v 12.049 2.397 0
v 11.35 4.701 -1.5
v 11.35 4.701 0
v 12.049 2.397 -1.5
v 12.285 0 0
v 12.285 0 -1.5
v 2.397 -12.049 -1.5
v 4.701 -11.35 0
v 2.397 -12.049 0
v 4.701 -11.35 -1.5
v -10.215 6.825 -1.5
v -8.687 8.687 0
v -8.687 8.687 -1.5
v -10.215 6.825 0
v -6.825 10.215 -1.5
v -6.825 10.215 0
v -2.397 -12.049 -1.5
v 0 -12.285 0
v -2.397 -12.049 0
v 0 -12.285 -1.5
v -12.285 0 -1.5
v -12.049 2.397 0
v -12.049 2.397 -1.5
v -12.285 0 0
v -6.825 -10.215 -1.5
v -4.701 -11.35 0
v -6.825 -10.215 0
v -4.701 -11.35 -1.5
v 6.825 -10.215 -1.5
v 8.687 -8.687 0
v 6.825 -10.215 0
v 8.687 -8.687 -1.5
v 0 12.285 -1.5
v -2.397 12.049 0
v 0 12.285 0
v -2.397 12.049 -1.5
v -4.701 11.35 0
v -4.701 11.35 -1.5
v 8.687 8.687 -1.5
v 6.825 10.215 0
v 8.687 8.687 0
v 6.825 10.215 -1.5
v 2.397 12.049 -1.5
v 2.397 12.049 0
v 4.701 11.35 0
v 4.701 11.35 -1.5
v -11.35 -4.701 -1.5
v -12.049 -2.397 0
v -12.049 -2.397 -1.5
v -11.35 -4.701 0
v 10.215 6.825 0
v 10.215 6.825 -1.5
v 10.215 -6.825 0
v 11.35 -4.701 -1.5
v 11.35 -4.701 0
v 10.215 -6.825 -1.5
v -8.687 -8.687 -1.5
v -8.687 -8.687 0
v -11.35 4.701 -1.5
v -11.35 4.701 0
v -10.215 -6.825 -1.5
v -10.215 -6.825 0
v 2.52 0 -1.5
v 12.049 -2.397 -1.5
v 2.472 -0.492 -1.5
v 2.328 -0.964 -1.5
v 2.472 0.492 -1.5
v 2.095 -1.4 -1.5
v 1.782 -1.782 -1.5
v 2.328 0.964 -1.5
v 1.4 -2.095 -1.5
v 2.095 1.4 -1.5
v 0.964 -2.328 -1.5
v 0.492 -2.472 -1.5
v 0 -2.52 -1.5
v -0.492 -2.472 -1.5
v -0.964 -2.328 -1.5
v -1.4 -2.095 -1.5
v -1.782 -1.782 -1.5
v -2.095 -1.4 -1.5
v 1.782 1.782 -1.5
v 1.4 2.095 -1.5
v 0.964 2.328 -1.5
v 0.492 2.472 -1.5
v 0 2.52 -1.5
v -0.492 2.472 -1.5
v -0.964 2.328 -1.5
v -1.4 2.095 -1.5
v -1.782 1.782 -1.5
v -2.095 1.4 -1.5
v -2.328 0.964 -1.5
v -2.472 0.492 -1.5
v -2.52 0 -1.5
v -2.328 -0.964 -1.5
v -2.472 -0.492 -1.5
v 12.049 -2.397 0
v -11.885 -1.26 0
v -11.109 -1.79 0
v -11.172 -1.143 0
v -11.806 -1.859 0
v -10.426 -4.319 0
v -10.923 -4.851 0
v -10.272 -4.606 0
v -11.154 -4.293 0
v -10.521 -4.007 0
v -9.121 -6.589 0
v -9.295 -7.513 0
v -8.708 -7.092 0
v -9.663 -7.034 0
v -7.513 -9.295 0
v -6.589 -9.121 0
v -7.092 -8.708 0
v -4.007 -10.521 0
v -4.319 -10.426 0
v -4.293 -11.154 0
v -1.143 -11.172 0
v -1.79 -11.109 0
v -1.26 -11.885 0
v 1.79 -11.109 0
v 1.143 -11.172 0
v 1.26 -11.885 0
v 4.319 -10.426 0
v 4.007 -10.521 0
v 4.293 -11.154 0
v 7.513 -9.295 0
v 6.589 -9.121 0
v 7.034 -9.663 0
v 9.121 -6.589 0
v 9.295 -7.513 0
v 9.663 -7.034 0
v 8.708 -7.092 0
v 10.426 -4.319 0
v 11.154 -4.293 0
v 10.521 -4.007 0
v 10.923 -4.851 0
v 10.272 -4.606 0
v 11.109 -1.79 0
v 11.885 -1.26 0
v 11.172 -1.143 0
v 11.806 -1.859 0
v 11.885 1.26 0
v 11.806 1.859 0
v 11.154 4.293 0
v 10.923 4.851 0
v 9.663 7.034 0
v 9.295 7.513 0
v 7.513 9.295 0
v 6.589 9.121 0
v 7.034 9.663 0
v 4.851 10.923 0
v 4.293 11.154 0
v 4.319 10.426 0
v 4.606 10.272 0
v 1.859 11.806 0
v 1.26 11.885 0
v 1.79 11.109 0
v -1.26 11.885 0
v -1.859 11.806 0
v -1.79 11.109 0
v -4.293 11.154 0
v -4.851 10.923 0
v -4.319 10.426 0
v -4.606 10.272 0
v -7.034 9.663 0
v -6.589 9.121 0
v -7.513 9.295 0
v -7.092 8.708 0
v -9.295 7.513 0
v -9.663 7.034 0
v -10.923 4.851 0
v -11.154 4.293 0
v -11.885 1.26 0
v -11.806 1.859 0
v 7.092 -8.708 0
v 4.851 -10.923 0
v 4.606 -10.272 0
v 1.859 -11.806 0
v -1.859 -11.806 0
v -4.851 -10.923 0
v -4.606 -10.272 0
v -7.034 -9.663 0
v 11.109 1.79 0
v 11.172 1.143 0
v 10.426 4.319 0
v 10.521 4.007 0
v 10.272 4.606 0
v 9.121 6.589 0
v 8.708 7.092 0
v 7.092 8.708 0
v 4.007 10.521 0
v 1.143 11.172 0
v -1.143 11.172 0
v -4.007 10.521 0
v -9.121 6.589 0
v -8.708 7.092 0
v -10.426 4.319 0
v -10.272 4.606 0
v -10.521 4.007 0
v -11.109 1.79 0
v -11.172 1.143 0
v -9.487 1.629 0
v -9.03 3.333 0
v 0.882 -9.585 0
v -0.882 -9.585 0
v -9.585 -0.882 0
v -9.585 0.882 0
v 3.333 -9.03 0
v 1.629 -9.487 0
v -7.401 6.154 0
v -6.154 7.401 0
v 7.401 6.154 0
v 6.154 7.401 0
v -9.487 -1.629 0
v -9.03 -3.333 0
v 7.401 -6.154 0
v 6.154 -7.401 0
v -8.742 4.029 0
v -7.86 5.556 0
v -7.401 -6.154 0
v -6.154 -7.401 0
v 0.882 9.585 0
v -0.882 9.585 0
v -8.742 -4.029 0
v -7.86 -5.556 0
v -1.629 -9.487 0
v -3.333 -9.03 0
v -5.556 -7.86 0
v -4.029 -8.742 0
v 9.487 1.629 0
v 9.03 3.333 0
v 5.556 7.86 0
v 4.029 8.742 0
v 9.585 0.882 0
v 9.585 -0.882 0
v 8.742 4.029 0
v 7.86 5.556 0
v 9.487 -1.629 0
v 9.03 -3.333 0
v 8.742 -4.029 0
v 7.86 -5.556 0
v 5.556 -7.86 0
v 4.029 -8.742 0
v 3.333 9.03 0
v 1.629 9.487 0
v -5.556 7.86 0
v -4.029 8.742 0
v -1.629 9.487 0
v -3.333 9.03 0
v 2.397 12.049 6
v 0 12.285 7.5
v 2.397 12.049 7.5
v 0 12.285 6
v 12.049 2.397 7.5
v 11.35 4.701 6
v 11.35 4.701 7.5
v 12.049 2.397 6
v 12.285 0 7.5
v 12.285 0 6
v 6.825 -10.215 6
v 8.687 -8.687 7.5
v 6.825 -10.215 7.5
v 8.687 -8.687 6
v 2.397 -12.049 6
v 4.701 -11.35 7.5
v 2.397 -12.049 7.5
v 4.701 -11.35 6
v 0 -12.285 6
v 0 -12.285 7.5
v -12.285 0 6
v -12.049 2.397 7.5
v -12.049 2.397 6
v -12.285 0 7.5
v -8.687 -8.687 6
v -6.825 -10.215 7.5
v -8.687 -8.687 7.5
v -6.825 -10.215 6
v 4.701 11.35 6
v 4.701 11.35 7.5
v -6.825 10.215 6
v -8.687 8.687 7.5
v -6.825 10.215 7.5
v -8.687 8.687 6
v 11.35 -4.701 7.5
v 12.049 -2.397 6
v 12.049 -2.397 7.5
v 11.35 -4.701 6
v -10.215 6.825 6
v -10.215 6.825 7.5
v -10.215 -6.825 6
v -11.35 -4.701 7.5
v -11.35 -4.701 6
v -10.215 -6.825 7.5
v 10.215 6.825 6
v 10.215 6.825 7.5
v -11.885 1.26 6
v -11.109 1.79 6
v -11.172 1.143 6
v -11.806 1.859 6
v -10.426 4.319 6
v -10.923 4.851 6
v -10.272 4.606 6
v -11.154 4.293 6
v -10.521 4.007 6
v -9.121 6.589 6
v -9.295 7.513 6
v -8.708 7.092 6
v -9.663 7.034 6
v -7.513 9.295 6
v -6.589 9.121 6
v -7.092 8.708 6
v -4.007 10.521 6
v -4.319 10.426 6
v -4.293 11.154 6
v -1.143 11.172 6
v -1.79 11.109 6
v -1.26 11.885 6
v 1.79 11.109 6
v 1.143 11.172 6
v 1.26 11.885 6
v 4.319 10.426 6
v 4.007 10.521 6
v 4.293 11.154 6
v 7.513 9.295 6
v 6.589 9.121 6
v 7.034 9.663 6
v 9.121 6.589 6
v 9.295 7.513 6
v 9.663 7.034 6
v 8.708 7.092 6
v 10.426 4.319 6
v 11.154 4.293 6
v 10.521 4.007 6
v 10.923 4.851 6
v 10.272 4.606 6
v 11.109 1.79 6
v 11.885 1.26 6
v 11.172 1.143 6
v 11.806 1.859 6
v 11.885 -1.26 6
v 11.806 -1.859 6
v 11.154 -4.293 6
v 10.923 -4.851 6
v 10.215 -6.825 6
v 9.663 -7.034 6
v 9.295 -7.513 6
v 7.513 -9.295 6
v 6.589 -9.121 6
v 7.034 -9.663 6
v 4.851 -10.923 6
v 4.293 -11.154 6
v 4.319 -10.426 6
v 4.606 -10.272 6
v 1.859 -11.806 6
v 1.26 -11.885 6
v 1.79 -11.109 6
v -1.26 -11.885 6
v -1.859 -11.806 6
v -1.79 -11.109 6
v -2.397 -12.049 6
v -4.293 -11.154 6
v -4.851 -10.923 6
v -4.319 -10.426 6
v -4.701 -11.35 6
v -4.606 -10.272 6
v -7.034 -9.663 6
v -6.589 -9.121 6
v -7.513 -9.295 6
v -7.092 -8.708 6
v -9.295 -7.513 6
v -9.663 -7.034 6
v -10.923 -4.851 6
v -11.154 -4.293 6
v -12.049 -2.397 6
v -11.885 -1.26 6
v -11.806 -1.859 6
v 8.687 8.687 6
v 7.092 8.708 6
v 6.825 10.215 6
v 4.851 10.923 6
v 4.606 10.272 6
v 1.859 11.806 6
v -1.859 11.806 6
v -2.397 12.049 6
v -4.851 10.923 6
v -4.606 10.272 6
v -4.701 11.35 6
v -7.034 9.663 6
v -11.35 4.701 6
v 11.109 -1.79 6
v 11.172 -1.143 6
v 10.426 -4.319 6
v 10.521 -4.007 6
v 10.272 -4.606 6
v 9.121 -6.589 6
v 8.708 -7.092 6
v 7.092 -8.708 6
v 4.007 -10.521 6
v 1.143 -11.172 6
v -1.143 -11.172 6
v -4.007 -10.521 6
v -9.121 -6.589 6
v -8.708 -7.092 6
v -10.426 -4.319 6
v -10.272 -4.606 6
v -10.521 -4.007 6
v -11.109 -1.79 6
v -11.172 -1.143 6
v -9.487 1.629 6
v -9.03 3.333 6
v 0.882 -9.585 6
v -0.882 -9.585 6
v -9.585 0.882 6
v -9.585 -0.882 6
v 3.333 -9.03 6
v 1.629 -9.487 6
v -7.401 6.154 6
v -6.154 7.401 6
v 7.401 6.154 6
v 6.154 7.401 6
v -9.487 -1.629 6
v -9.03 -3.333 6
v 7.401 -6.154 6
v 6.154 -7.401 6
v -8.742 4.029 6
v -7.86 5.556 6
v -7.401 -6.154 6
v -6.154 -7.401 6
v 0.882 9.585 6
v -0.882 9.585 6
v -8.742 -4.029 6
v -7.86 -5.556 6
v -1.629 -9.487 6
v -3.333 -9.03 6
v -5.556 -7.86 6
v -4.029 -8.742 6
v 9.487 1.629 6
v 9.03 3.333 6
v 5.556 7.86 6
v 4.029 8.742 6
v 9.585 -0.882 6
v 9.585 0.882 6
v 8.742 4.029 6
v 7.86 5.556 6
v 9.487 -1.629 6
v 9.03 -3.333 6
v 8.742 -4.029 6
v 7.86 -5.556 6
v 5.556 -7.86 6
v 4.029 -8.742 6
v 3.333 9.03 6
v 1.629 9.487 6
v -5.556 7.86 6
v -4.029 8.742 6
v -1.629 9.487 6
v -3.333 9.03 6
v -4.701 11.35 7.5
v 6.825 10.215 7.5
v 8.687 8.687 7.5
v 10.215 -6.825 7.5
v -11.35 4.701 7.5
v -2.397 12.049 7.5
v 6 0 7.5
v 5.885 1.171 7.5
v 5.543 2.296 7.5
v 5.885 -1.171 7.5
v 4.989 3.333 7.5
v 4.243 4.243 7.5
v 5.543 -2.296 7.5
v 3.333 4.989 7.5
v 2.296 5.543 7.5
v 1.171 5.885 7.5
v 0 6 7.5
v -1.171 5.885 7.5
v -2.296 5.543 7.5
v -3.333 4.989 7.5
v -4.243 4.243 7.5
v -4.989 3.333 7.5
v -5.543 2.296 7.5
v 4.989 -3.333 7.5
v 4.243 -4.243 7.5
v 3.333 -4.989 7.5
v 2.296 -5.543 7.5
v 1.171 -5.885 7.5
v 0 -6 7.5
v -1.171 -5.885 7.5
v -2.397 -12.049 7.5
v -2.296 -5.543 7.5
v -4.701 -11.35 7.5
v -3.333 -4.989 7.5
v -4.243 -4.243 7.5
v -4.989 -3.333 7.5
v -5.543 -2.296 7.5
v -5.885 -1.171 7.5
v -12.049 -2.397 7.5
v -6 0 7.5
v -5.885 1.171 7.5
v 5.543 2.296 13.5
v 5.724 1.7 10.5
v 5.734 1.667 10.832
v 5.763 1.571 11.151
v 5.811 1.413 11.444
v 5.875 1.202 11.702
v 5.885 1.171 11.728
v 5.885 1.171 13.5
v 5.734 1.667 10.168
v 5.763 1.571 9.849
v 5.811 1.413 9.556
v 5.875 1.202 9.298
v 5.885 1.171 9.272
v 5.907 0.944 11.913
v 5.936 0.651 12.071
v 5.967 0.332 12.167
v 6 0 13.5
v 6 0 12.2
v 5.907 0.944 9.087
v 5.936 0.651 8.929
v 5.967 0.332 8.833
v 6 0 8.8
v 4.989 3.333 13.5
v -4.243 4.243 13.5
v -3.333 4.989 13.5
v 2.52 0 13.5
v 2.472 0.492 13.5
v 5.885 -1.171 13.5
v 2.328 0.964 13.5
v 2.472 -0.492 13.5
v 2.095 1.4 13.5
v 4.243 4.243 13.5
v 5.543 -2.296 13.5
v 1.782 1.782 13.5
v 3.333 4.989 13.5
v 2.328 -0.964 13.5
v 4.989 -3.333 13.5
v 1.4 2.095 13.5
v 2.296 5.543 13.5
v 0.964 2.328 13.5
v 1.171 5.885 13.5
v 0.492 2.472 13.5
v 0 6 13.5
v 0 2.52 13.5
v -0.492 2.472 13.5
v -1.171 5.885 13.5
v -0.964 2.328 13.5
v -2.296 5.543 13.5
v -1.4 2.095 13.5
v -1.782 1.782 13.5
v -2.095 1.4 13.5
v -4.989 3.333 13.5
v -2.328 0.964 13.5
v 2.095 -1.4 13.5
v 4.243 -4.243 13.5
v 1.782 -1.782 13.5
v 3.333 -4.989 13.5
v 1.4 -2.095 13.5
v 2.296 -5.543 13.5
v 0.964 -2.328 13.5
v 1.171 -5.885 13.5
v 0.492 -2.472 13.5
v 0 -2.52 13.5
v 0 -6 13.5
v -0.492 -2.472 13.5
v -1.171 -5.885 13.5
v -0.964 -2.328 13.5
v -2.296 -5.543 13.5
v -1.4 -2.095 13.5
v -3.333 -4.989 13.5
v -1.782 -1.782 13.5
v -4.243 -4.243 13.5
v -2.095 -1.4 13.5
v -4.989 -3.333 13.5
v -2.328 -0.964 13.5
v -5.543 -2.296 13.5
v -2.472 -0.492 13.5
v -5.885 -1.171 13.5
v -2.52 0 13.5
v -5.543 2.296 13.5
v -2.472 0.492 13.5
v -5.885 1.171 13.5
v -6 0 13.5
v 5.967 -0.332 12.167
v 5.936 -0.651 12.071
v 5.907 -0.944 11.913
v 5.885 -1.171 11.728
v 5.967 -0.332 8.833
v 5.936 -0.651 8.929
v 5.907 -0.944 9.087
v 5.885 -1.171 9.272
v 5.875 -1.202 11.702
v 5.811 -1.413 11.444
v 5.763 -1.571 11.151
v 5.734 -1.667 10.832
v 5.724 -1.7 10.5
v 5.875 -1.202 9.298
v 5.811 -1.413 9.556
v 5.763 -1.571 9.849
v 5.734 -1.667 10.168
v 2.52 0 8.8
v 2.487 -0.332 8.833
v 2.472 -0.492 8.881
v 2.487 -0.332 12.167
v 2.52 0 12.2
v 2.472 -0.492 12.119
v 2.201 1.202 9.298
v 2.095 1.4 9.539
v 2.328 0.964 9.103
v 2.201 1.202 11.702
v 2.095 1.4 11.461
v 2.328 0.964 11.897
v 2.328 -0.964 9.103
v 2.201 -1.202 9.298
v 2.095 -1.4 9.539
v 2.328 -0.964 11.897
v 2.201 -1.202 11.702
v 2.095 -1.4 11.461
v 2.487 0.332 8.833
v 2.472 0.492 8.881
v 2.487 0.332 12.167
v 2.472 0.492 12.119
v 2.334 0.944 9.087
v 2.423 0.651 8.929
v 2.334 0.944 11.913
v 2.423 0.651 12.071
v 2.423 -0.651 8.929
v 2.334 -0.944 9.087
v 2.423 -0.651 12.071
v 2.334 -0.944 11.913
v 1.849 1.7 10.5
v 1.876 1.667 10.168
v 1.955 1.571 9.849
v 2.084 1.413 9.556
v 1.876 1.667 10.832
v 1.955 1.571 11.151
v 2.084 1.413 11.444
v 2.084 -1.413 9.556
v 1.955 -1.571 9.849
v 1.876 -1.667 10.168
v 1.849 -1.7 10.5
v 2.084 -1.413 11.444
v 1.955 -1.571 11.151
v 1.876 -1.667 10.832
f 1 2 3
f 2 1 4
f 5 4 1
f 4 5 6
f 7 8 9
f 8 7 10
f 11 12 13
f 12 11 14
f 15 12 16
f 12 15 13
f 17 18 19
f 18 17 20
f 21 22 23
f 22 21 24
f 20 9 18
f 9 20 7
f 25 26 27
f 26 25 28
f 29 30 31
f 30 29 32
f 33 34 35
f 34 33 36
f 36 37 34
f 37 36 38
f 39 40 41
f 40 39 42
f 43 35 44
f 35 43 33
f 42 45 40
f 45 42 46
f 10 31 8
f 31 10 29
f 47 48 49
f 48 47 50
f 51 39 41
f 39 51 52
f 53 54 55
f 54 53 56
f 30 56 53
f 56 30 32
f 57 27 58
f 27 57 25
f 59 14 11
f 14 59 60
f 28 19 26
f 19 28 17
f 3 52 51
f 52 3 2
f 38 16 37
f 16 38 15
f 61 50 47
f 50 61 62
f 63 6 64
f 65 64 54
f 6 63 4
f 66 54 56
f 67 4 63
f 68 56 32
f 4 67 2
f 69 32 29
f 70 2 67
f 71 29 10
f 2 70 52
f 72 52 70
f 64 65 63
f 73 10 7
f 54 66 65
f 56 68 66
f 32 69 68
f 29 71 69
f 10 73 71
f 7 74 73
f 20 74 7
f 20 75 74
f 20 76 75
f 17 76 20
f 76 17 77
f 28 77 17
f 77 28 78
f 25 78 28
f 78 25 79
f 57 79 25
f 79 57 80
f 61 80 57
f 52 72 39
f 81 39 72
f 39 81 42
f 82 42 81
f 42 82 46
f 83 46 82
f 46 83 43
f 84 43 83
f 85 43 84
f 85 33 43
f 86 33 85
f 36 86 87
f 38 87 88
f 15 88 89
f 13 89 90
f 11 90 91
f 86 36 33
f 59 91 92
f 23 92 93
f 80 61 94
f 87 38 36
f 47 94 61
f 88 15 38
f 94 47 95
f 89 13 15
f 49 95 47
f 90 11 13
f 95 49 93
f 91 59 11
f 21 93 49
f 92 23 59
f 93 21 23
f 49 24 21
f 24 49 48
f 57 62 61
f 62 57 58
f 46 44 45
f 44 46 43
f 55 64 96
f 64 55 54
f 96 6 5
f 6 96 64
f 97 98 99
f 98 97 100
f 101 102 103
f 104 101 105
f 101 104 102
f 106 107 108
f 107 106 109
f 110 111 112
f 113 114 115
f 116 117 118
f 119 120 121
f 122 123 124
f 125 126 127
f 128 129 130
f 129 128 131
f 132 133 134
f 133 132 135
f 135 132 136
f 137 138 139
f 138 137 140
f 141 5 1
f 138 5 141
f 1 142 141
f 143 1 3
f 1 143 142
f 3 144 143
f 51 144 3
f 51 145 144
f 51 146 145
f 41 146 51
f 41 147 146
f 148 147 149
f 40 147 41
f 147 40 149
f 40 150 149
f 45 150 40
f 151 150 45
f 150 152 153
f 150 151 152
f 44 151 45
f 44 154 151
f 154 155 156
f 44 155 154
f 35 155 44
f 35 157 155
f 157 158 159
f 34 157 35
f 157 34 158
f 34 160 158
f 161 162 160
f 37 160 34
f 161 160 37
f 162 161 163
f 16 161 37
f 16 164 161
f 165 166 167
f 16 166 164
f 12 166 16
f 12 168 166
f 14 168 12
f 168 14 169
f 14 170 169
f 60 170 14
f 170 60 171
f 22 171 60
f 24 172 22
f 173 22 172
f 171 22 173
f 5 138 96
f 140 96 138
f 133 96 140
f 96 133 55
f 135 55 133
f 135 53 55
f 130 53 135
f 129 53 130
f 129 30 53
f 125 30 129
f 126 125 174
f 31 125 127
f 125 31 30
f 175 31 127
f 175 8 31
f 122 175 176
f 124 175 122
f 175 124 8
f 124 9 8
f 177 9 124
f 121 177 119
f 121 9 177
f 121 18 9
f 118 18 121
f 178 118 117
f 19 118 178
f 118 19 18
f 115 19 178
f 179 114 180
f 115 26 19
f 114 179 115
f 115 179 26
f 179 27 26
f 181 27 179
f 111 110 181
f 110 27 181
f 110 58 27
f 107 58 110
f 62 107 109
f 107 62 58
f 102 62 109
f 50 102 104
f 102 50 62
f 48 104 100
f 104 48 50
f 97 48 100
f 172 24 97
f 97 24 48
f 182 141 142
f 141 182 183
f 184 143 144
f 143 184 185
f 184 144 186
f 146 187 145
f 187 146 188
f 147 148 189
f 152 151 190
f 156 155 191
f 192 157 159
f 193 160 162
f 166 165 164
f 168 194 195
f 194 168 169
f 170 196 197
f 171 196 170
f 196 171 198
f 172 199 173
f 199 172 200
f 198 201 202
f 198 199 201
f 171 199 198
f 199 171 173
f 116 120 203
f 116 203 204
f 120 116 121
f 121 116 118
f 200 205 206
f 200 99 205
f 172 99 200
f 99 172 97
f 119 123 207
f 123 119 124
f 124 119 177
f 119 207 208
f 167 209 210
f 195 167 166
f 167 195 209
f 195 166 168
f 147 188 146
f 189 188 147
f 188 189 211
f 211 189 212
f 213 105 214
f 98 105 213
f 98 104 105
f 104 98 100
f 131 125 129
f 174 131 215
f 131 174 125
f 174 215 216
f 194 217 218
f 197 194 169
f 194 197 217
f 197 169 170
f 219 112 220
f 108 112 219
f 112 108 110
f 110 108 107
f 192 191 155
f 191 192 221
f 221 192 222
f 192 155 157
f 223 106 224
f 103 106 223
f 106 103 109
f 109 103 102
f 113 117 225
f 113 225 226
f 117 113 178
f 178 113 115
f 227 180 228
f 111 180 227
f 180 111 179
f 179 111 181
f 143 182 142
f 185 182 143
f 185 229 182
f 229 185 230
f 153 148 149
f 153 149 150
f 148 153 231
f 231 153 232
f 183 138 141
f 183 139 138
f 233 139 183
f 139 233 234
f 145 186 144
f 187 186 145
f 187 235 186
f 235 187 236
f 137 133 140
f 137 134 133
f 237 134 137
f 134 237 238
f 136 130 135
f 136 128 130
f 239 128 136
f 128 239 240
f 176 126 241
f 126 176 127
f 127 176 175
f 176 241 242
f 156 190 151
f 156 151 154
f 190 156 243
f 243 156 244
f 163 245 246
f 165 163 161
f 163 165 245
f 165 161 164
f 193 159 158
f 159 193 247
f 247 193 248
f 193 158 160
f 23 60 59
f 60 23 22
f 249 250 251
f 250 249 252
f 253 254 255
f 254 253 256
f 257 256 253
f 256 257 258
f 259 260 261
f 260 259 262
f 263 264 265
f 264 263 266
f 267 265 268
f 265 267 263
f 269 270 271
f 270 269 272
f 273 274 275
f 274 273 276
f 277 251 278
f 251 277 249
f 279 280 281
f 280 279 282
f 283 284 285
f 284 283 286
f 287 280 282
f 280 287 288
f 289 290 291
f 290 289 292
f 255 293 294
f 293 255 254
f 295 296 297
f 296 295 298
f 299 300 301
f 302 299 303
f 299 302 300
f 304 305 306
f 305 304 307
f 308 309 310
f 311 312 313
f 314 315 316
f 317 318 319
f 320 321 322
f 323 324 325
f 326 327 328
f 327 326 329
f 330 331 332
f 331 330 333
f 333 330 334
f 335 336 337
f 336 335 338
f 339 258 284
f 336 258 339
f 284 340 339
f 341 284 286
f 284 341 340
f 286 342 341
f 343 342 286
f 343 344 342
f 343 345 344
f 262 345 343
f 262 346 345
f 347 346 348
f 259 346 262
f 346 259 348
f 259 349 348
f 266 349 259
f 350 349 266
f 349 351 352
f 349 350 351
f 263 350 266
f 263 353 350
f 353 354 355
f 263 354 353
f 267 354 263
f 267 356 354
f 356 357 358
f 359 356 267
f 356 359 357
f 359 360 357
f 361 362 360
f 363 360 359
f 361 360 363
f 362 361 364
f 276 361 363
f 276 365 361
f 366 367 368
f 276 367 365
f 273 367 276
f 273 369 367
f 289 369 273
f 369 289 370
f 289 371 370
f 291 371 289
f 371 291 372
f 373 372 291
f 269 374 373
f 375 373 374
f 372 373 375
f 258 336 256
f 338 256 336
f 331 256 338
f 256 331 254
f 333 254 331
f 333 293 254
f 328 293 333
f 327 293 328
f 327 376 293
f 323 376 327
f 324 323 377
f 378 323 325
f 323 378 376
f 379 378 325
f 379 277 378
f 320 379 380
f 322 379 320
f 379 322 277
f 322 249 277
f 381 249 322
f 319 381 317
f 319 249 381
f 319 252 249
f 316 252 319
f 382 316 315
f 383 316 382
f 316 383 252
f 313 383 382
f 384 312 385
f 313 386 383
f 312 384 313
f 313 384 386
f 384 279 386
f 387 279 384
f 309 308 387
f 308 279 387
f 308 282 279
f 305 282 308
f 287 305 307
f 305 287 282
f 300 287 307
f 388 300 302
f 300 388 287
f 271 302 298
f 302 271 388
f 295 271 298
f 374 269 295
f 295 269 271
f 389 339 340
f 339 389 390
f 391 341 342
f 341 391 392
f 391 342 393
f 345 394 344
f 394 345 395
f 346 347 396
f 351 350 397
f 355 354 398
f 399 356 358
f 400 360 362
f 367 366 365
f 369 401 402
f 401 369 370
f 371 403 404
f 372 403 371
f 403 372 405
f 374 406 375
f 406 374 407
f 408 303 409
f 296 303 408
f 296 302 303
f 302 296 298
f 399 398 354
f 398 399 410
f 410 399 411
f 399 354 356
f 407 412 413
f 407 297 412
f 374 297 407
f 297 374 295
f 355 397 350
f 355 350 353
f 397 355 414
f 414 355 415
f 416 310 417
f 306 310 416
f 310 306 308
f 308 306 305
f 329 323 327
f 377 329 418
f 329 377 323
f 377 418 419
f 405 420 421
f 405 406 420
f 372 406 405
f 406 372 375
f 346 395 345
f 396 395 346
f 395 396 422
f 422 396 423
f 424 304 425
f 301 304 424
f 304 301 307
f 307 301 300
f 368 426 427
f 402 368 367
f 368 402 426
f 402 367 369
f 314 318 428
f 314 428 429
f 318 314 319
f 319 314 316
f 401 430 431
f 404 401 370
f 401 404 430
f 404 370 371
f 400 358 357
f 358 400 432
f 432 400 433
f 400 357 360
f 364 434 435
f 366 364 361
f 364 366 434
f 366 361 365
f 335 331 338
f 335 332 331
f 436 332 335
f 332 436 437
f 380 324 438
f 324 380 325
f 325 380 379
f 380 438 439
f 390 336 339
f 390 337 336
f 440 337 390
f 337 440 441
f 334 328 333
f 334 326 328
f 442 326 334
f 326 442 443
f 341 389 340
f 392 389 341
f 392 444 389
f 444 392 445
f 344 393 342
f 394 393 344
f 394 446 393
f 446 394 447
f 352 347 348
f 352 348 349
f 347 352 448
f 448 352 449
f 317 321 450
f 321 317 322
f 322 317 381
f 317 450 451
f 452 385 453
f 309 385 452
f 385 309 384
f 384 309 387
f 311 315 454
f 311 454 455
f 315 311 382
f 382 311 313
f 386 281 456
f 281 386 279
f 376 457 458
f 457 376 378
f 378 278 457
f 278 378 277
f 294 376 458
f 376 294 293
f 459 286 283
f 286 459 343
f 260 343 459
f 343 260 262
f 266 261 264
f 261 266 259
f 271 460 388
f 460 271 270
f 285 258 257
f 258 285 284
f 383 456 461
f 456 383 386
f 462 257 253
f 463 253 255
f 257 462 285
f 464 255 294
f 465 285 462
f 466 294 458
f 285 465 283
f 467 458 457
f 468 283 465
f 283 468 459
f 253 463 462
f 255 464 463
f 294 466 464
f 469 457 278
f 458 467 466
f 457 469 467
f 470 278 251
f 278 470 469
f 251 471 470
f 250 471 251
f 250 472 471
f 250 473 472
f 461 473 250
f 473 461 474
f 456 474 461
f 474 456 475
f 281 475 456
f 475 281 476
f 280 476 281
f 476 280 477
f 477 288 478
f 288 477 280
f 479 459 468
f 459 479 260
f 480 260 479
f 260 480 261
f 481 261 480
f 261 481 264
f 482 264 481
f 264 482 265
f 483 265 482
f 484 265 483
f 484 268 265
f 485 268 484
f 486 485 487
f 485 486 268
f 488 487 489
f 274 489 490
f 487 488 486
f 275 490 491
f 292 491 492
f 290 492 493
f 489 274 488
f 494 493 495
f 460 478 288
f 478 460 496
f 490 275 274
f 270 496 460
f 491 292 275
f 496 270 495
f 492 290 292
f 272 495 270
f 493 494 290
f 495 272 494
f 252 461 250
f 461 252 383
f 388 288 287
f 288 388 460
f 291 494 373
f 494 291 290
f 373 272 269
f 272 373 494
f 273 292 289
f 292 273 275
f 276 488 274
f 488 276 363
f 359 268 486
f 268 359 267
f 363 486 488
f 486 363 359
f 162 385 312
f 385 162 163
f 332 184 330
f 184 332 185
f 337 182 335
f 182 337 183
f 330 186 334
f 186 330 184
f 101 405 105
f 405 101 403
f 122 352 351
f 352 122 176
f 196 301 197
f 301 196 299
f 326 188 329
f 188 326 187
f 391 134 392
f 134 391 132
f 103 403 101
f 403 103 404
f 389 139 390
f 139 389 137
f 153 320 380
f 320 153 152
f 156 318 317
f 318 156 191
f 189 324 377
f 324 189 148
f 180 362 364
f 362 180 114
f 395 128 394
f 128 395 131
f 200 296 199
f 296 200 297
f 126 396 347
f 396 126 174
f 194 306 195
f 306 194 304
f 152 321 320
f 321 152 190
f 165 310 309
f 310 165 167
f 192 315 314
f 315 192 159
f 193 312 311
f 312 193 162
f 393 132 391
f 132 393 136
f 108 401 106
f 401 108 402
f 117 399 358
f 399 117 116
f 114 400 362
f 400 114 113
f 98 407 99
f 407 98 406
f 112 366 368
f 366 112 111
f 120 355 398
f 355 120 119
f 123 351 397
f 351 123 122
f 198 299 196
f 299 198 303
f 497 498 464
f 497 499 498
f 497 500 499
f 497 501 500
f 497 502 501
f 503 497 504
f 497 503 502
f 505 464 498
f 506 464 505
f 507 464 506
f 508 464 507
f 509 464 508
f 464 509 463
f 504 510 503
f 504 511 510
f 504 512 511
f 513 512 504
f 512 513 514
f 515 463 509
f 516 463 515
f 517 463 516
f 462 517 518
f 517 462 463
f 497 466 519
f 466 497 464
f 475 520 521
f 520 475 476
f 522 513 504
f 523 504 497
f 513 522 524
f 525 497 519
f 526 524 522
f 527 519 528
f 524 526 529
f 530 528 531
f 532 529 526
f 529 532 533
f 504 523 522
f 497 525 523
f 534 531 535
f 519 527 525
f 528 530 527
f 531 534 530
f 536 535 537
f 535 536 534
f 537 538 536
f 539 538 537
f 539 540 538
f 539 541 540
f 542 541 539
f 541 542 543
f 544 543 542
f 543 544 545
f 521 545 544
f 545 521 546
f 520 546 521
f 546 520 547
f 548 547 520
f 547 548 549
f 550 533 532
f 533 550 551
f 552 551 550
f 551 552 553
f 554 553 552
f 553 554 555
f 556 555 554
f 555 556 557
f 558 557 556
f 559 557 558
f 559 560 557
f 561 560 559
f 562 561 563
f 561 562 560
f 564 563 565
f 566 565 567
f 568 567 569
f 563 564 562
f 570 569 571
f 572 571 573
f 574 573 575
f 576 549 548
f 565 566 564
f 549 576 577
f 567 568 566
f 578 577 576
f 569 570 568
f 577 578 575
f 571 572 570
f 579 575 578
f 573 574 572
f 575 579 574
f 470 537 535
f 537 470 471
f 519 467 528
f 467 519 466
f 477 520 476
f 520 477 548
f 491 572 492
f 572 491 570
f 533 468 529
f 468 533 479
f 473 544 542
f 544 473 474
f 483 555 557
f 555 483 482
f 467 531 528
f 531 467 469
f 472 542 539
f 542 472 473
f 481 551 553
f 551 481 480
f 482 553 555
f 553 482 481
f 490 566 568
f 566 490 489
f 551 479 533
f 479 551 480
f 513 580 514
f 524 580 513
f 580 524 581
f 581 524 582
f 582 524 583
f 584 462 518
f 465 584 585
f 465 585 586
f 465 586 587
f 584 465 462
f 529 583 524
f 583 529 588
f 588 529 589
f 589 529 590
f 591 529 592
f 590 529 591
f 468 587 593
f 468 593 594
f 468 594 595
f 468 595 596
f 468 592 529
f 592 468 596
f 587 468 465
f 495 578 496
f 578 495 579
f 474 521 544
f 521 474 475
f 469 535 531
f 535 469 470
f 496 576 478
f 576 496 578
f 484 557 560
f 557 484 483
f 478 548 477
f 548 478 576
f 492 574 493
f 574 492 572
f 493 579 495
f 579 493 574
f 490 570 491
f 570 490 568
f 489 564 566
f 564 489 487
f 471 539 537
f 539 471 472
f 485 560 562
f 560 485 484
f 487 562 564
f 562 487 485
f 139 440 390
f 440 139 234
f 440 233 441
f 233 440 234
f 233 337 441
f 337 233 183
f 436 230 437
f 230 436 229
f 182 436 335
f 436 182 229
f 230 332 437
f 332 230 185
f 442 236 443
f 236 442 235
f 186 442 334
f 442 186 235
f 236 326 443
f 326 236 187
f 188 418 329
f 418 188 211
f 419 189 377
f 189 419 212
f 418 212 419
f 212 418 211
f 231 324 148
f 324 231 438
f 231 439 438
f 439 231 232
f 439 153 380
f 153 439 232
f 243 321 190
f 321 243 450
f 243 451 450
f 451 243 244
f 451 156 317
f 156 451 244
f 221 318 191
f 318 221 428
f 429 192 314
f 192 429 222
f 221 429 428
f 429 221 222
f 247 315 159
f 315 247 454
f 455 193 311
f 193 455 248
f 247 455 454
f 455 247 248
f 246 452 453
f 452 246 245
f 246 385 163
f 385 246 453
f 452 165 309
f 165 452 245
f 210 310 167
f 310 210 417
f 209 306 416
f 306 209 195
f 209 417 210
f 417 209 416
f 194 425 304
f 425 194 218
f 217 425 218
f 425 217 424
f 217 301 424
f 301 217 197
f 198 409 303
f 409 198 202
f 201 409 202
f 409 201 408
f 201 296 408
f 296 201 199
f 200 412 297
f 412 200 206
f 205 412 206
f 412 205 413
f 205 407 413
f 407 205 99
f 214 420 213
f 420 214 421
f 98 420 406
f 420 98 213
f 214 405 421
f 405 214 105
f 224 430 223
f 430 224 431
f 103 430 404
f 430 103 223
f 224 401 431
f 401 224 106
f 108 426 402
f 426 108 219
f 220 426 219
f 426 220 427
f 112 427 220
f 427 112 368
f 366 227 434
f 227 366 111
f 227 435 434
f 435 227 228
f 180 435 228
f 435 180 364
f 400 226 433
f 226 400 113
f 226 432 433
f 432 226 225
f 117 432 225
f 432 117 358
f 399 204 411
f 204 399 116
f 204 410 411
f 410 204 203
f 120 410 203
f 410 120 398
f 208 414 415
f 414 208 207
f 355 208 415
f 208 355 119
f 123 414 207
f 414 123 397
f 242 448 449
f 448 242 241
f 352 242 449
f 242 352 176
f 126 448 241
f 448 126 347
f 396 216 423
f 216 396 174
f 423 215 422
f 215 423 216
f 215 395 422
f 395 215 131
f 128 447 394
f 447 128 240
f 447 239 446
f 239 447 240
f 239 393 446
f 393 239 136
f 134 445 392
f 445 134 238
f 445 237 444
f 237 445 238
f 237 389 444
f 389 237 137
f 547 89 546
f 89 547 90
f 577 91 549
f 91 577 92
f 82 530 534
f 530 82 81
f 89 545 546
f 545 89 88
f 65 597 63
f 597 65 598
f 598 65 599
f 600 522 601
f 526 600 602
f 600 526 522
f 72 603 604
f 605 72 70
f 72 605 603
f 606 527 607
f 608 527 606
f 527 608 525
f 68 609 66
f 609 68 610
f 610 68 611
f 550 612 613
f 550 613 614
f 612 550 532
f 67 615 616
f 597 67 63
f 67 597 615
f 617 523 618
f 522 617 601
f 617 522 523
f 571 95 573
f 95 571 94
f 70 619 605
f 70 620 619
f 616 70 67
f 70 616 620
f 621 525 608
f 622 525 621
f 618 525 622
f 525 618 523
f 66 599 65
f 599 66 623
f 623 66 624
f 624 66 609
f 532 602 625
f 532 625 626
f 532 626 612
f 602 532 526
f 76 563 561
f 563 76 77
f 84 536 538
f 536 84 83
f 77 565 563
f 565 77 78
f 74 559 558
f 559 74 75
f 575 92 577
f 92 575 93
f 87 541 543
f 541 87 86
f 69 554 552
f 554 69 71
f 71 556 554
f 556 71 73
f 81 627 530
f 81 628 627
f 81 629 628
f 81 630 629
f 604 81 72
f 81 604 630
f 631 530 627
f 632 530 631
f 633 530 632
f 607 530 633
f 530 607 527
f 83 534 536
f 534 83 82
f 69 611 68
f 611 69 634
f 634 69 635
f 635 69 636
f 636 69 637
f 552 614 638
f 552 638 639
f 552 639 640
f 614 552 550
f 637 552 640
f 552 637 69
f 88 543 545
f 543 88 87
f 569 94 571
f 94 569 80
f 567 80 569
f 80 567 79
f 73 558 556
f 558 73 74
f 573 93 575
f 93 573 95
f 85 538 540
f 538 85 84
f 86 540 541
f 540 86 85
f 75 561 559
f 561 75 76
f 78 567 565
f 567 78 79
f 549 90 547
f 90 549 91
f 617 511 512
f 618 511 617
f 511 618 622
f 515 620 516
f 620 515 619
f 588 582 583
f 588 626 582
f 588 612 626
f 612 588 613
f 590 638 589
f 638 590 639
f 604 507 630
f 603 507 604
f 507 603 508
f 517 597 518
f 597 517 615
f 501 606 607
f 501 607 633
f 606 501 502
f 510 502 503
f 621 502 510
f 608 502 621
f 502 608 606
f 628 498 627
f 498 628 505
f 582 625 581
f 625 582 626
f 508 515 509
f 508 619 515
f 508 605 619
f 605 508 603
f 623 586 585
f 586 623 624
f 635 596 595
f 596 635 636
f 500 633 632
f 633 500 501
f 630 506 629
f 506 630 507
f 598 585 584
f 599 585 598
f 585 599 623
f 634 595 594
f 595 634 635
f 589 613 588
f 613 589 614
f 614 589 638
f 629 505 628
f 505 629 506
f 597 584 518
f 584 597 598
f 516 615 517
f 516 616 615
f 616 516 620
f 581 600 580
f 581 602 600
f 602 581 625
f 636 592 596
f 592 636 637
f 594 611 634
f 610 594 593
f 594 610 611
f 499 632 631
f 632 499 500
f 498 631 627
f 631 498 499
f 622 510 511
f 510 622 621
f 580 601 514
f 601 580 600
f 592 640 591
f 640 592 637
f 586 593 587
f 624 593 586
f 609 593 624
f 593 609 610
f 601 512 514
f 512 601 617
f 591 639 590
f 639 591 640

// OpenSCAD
$fn = 32;

// ----------------------------------------------------------------------
// Timing pulley: GT3 24T, pitch 3 mm, 24.57 mm x 15 mm
// ----------------------------------------------------------------------

// --- parameters (mm) ---
belt_pitch = 3;           // belt pitch
n_teeth = 24;             // number of grooves
rim_w = 6;                // belt width between the flanges
tip_d = 22.57;            // tip circle diameter
root_d = 20.37;           // groove bottom diameter
groove_h = 1.1;           // groove depth
tooth_w = 2.1;            // groove width at the tip circle
rim_d = 24.57;            // flange diameter
rim_t = 1.5;              // flange thickness
spigot_d = 18.77;         // flange spigot, sunk into the rim
spigot_h = 1.2;           // spigot depth into the rim
shaft_d = 5.04;           // shaft bore
hub_d = 12;               // hub diameter
hub_h = 6;                // hub above the flange
bottom_z = -1.5;          // lowest point of the pulley
top_z = 13.5;             // highest point of the pulley
set_d = 3.4;              // set screw tap hole

module rim() {
  cylinder(h = rim_w, d = tip_d);
}

module groove_cutter() {
  /* belt tooth groove: deeper than wide, cut through the belt width */
  translate([root_d / 2, 0, 0])
    linear_extrude(height = rim_w)
      polygon(points = [[-0.6, -tooth_w * 0.42], [groove_h + 0.6, -tooth_w * 0.6],
                        [groove_h + 0.6, tooth_w * 0.6], [-0.6, tooth_w * 0.42]]);
}

module flanges() {
  translate([0, 0, -rim_t]) cylinder(h = rim_t, d = rim_d);
  translate([0, 0, rim_w]) cylinder(h = rim_t, d = rim_d);
  translate([0, 0, -spigot_h]) cylinder(h = spigot_h + 0.6, d = spigot_d);
  translate([0, 0, rim_w - 0.6]) cylinder(h = spigot_h + 0.6, d = spigot_d);
}

module hub() {
  translate([0, 0, bottom_z]) cylinder(h = top_z - bottom_z, d = hub_d);
}

difference() {
  union() {
    rim();
    hub();
    flanges();
  }
  for (i = [0 : n_teeth - 1]) rotate([0, 0, i * 360 / n_teeth]) groove_cutter();
  translate([0, 0, bottom_z - 1]) cylinder(h = top_z - bottom_z + 2, d = shaft_d);
  translate([-1, 0, top_z - hub_h * 0.5]) rotate([0, 90, 0]) cylinder(h = hub_d / 2 + 3, d = set_d);
}
